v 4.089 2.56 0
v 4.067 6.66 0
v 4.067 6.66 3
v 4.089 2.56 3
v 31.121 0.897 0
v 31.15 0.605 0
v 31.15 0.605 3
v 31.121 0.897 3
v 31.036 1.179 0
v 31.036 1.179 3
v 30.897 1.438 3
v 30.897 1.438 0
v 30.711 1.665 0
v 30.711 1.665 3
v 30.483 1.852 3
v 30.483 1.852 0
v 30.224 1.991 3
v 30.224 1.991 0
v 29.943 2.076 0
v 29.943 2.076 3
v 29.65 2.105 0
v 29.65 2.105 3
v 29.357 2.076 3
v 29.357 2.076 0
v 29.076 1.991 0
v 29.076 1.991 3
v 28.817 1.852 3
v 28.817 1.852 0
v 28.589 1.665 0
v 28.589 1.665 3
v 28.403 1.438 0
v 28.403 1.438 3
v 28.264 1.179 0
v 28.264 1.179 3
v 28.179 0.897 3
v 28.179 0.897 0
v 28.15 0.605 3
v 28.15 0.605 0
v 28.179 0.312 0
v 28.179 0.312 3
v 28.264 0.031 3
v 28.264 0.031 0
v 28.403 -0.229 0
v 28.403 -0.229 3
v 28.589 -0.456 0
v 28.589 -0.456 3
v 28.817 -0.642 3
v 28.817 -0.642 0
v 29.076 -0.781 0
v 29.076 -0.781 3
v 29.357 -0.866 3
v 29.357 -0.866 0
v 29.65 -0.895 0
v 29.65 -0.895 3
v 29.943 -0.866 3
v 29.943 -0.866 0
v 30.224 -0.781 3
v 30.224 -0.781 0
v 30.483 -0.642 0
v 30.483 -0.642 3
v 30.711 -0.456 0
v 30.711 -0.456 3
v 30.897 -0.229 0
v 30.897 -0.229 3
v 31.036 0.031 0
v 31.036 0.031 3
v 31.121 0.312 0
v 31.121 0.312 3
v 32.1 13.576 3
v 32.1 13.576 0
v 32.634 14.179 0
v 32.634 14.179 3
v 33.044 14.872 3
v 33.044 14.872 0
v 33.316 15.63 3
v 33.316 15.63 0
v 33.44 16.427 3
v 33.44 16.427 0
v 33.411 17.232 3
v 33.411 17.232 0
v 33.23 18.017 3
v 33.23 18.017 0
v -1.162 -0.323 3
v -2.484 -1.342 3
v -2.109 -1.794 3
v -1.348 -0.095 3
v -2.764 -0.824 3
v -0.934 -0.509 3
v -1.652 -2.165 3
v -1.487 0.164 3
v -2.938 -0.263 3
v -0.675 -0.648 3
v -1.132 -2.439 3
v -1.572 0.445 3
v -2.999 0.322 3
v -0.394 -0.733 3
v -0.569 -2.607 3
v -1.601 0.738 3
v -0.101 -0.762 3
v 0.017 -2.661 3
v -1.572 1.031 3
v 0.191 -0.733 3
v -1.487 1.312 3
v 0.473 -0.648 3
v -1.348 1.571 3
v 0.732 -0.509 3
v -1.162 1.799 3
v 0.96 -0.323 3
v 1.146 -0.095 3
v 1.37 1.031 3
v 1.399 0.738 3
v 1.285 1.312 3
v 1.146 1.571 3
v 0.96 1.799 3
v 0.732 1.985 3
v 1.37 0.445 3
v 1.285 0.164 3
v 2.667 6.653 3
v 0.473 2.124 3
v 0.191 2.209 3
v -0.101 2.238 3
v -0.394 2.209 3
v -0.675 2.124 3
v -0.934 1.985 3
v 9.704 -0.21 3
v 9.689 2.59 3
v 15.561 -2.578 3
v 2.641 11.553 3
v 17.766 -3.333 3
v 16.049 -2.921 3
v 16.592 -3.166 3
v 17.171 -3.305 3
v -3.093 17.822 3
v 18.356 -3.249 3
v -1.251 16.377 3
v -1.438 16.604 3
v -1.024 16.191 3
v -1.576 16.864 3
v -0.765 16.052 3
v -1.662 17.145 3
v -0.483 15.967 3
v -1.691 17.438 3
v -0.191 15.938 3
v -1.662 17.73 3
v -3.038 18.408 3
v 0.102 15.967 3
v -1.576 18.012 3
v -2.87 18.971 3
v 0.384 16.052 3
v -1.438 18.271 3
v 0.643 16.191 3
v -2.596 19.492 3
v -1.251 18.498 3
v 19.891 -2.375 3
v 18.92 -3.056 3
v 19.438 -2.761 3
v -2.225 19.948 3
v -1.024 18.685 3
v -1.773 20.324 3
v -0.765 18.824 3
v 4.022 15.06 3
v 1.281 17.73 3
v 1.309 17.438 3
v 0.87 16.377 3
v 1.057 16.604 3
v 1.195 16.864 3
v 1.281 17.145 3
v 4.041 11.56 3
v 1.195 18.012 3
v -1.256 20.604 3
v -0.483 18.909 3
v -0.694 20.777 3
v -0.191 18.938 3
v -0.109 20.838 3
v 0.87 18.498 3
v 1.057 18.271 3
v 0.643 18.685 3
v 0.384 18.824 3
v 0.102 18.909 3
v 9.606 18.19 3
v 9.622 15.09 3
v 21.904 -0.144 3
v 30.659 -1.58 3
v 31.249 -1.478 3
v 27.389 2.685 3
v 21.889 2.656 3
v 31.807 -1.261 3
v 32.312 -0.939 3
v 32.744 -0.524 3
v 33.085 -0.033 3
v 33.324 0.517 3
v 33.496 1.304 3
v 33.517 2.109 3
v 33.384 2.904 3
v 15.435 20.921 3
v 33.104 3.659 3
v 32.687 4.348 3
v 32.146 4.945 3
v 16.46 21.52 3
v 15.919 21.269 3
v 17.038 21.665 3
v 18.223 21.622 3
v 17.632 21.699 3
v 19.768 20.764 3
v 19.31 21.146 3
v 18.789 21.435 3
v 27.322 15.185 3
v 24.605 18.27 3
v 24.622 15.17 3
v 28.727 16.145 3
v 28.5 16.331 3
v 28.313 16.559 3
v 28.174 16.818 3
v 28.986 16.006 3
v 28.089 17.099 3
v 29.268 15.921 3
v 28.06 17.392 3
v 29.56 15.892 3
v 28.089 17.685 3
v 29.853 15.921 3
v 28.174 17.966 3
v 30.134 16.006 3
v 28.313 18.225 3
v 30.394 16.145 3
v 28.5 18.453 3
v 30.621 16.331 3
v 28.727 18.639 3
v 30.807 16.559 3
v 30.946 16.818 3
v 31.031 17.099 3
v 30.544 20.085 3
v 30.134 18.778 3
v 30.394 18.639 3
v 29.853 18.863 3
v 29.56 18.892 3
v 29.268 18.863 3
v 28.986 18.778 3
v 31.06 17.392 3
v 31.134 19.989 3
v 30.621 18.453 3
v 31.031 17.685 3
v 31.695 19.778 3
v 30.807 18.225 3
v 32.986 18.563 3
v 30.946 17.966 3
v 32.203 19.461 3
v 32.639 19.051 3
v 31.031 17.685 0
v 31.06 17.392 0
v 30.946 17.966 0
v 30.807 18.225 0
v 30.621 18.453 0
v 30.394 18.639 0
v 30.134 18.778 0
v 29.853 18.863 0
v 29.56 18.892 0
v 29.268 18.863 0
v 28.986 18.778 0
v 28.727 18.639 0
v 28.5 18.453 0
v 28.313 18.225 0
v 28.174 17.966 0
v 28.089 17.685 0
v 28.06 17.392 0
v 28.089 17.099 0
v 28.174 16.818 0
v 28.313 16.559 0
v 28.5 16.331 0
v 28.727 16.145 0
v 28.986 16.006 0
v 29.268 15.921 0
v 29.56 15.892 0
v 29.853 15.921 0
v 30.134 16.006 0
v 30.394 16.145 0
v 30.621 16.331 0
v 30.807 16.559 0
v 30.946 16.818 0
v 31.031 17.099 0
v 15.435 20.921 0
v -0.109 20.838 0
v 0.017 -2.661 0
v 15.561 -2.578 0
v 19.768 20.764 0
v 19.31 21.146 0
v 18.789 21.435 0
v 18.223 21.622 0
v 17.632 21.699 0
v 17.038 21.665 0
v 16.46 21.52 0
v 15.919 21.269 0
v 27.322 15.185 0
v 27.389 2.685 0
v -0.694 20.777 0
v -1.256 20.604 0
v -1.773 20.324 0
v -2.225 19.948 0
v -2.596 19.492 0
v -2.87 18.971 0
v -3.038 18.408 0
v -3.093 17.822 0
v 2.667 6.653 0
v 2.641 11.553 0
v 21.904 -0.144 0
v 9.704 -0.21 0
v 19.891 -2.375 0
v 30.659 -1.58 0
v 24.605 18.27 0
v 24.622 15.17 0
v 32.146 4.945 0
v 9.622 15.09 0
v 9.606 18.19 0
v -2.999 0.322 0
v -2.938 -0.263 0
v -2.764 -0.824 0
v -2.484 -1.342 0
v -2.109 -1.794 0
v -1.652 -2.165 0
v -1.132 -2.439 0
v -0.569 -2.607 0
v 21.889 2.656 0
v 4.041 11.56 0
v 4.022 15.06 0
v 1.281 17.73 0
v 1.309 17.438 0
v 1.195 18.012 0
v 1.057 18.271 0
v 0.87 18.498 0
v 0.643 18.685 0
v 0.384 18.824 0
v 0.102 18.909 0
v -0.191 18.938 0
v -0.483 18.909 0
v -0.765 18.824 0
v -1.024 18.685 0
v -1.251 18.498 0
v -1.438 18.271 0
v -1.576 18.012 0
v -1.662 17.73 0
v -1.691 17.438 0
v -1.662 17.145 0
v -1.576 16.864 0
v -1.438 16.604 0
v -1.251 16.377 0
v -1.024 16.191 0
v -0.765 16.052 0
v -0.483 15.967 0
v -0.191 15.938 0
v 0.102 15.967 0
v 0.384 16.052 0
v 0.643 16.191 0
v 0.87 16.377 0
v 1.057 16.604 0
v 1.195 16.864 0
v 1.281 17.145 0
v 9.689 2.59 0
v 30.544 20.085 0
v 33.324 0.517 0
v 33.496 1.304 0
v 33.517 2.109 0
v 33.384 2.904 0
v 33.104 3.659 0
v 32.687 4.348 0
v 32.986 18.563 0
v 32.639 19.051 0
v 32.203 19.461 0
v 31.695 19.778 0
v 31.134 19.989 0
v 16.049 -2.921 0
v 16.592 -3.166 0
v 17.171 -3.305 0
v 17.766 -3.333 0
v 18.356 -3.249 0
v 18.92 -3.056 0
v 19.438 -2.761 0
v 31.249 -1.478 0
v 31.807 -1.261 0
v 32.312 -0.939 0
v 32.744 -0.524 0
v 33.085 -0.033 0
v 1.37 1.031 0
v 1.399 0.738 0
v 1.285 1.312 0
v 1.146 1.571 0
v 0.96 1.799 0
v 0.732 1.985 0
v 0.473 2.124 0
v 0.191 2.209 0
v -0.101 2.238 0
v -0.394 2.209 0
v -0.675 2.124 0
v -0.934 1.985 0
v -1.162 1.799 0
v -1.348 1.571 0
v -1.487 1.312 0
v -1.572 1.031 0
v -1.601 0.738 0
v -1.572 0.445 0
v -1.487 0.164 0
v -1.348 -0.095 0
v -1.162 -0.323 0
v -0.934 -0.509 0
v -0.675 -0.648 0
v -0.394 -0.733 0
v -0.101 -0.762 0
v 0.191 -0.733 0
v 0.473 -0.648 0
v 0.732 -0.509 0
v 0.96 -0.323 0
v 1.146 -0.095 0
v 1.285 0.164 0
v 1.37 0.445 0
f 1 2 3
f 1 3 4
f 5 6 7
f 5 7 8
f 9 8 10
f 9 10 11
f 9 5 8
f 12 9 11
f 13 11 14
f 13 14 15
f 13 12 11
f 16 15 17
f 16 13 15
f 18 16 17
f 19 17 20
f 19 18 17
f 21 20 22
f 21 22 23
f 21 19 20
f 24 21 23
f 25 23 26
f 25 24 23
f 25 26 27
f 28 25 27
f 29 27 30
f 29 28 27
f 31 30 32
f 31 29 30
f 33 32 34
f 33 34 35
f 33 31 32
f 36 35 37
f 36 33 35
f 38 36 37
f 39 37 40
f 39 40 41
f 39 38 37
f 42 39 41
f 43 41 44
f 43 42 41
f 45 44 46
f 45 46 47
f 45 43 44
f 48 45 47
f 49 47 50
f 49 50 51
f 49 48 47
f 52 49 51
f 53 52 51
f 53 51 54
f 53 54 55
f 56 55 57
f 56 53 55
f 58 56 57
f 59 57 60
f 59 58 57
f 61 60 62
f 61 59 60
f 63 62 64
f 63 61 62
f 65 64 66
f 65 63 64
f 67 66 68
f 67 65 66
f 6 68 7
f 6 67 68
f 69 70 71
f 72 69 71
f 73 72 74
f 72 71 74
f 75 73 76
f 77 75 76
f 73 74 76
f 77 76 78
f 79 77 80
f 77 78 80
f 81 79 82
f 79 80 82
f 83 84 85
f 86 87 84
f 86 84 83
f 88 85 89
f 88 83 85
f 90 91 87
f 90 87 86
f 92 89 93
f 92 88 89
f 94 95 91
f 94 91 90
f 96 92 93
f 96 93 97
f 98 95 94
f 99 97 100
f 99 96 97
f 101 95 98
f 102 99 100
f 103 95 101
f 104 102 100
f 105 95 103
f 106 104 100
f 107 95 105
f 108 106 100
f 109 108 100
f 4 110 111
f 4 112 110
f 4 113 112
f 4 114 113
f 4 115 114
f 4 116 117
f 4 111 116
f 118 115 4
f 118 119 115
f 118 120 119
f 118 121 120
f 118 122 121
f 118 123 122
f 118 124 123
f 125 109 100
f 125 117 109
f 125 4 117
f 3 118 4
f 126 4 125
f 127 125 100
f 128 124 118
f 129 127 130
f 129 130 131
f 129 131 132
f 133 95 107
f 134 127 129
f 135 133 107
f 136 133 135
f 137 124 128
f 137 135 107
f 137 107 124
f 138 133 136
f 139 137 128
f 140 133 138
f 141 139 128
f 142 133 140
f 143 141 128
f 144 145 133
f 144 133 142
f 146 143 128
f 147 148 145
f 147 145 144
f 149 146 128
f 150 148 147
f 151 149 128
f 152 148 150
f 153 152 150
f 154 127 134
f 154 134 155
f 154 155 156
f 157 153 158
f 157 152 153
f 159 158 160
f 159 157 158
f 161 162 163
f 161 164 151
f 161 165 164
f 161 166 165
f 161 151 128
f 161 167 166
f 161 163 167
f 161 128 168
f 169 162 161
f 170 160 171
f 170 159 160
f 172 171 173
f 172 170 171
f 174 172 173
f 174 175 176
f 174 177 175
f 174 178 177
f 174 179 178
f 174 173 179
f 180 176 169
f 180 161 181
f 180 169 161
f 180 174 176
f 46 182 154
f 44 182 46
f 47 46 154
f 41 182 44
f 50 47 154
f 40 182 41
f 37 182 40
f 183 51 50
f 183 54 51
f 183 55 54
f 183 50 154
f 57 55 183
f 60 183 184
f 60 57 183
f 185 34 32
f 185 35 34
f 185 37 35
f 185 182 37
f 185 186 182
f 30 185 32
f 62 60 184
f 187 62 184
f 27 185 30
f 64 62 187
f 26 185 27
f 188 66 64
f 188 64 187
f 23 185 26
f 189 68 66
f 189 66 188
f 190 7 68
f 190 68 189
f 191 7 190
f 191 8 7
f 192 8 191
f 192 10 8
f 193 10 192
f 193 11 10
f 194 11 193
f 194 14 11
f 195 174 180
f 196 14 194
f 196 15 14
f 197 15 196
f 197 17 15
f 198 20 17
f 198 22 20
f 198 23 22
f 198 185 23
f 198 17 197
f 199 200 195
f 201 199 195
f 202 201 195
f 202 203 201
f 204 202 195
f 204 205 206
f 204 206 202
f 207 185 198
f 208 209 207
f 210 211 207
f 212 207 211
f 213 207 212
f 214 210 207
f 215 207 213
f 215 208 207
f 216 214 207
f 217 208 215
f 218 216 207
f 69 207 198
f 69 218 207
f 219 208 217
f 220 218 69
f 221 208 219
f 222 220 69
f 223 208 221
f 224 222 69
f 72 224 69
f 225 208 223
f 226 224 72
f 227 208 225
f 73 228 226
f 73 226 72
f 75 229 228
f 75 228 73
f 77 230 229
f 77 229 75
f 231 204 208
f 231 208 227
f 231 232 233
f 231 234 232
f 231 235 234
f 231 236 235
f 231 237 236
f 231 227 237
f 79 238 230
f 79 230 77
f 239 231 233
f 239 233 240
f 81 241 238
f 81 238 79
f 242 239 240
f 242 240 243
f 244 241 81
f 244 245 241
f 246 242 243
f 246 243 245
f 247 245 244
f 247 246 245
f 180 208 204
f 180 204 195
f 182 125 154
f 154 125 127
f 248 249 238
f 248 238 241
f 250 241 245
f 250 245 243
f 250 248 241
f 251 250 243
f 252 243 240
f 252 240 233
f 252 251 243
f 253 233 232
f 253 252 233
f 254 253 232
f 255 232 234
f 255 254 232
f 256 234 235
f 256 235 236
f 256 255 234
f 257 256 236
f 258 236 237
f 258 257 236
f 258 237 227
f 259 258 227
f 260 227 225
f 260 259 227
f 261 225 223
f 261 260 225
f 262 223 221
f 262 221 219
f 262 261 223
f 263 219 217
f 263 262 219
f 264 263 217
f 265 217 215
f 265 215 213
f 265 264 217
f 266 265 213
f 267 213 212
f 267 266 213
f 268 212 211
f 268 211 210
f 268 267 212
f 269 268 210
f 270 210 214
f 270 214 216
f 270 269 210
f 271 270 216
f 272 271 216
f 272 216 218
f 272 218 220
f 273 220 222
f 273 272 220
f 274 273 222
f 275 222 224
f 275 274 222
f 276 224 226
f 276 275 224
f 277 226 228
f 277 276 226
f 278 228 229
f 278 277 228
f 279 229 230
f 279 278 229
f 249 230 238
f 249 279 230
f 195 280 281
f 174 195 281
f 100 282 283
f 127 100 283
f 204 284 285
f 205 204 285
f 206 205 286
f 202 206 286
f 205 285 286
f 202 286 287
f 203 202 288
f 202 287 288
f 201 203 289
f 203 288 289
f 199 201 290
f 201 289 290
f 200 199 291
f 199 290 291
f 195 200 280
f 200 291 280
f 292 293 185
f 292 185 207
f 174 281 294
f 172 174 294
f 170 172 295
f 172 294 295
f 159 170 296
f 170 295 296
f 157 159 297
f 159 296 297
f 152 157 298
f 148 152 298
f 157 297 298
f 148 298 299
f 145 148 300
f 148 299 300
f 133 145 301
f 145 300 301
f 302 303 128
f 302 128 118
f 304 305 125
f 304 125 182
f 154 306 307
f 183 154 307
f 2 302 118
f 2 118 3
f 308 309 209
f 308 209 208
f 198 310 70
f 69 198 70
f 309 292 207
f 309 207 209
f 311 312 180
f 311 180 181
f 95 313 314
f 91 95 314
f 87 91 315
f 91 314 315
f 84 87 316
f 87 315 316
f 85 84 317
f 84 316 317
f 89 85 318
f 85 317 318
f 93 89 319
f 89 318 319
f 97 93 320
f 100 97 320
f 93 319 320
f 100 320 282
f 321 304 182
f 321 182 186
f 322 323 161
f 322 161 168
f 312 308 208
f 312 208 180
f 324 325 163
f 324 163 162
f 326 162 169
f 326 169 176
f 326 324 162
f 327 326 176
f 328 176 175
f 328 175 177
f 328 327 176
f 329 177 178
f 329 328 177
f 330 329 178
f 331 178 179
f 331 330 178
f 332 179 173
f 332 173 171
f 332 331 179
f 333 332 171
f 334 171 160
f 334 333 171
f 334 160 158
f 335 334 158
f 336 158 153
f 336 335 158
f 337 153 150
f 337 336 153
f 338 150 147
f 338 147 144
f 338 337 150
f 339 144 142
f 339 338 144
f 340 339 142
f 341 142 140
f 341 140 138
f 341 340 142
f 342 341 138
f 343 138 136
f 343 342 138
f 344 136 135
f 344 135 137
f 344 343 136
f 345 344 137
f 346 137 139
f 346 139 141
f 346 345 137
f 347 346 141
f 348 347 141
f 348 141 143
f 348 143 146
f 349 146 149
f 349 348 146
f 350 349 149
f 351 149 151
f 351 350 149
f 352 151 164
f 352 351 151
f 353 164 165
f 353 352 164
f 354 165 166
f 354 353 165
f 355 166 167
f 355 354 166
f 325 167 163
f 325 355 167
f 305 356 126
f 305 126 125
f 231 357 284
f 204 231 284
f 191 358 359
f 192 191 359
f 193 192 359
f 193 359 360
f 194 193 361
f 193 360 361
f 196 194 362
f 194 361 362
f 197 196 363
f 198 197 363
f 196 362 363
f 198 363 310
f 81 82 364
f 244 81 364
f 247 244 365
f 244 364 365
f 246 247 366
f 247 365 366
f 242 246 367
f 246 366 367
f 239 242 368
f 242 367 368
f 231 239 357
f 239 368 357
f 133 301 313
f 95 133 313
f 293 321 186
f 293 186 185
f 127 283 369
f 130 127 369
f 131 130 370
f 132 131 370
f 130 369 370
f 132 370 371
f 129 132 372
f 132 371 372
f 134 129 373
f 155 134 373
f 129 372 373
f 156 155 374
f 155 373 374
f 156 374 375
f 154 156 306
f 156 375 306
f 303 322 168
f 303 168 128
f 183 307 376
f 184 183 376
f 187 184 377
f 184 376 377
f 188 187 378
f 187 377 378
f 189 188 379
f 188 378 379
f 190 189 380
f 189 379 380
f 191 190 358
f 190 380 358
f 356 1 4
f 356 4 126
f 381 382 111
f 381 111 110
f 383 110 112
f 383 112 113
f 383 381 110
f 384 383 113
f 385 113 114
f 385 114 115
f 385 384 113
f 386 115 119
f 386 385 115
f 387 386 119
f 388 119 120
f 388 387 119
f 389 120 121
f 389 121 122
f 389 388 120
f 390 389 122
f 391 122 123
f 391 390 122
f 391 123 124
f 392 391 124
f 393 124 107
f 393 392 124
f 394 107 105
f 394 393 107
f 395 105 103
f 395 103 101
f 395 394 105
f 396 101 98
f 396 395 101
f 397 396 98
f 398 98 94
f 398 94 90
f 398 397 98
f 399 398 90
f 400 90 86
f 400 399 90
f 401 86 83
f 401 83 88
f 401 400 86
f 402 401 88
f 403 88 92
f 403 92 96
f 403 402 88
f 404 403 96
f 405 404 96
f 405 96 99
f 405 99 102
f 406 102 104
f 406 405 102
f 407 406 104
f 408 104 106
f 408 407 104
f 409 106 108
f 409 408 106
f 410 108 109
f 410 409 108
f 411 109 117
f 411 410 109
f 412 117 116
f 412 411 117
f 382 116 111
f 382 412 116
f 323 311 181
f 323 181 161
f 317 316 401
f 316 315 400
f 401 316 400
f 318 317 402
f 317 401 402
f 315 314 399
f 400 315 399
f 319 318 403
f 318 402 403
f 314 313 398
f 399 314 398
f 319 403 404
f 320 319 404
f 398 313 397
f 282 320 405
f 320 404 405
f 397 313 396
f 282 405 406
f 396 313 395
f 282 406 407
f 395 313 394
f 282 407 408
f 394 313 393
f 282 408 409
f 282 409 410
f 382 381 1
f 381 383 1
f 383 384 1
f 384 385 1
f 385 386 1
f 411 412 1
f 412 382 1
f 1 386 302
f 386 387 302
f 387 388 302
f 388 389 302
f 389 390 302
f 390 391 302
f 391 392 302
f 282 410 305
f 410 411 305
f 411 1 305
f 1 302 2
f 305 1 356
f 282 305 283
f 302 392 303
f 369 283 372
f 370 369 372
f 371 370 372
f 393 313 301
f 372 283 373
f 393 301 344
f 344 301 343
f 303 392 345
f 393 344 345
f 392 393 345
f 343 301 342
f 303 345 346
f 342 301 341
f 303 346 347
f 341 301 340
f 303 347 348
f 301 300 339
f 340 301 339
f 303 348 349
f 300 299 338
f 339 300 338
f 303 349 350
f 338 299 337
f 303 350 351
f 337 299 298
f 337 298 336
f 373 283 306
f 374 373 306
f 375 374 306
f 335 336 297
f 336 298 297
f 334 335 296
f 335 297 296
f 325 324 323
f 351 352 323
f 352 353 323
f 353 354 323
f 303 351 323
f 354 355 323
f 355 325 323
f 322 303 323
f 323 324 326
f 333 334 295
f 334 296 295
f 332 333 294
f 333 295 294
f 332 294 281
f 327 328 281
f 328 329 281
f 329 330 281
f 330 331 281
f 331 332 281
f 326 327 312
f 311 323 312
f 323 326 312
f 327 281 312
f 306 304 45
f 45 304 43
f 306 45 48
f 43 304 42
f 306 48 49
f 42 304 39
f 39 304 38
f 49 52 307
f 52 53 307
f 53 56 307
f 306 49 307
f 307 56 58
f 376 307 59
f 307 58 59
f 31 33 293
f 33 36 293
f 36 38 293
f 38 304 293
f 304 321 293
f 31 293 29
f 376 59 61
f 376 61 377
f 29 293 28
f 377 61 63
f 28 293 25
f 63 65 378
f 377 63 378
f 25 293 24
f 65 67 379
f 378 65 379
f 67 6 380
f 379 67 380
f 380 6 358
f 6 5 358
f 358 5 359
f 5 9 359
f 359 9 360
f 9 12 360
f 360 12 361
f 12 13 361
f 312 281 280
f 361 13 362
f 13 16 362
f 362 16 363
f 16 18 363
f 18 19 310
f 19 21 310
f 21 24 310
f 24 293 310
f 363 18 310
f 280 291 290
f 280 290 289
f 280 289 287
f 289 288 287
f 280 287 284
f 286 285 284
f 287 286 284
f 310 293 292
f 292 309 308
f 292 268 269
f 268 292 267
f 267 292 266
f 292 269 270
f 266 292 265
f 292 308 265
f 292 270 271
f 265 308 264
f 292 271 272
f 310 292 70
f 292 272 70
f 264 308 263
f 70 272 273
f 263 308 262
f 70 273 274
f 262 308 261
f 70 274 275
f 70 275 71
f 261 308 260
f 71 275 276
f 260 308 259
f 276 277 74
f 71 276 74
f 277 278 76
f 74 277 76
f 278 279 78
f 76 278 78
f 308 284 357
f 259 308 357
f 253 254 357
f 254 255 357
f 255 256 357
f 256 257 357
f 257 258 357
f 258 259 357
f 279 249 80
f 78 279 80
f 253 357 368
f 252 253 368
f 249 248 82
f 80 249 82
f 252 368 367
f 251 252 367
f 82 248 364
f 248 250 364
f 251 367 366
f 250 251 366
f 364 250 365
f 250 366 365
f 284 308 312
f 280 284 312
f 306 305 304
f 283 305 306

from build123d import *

# Parameters (mm, degrees)
SKETCH1_R           = 1.5
BOSS_EXTRUDE1_DEPTH = 3


with BuildPart() as part:
    # Sketch1 → Boss-Extrude1 (new body)
    with BuildSketch(Plane.XY):
        with BuildLine():
            Line((15.435057436, 20.921377099), (-0.10870117, 20.838196592))
            ThreePointArc((-0.10870117, 20.838196592), (-2.225289061, 19.948177695), (-3.092604315, 17.822185647))
            Line((-3.092604315, 17.822185647), (-2.998956565, 0.322436217))
            ThreePointArc((-2.998956565, 0.322436217), (-2.108937668, -1.794151674), (0.01705438, -2.661466928))
            Line((0.01705438, -2.661466928), (15.560812986, -2.578286421))
            ThreePointArc((15.560812986, -2.578286421), (17.766430895, -3.332819275), (19.891460268, -2.374528948))
            Line((19.891460268, -2.374528948), (30.659457178, -1.580311749))
            ThreePointArc((30.659457178, -1.580311749), (32.311987692, -0.938952483), (33.323696389, 0.516603879))
            ThreePointArc((33.323696389, 0.516603879), (33.38449749, 2.903690209), (32.146093551, 4.945315446))
            Line((32.146093551, 4.945315446), (32.099909063, 13.575709212))
            ThreePointArc((32.099909063, 13.575709212), (33.31639169, 15.630471471), (33.230046407, 18.016770366))
            ThreePointArc((33.230046407, 18.016770366), (32.202817639, 19.461415605), (30.543517656, 20.085052019))
            Line((30.543517656, 20.085052019), (19.767637393, 20.763979817))
            ThreePointArc((19.767637393, 20.763979817), (17.632473675, 21.699472247), (15.435057436, 20.921377099))
        make_face()
        with Locations((29.560164558, 17.392133017)):
            Circle(SKETCH1_R, mode=Mode.SUBTRACT)
        with Locations((29.65, 0.604781235)):
            Circle(SKETCH1_R, mode=Mode.SUBTRACT)
        with Locations((-0.101138608, 0.73794926)):
            Circle(SKETCH1_R, mode=Mode.SUBTRACT)
        with Locations((-0.190505318, 17.437710144)):
            Circle(SKETCH1_R, mode=Mode.SUBTRACT)
        Polygon((2.641027261, 11.552778262), (2.667248631, 6.652848422), (4.067228585, 6.660340242), (4.089168915, 2.560398947), (9.689088733, 2.590366227), (9.704072373, -0.209593682), (21.903897689, -0.144307821), (21.888914049, 2.655652087), (27.388835298, 2.685084237), (27.321944048, 15.184905259), (24.621982708, 15.170456748), (24.605393678, 18.270412362), (9.605608452, 18.190142862), (9.622197482, 15.090187248), (4.022277665, 15.060219968), (4.041007215, 11.560270082), align=None, mode=Mode.SUBTRACT)
    extrude(amount=BOSS_EXTRUDE1_DEPTH)


solid = part.part
